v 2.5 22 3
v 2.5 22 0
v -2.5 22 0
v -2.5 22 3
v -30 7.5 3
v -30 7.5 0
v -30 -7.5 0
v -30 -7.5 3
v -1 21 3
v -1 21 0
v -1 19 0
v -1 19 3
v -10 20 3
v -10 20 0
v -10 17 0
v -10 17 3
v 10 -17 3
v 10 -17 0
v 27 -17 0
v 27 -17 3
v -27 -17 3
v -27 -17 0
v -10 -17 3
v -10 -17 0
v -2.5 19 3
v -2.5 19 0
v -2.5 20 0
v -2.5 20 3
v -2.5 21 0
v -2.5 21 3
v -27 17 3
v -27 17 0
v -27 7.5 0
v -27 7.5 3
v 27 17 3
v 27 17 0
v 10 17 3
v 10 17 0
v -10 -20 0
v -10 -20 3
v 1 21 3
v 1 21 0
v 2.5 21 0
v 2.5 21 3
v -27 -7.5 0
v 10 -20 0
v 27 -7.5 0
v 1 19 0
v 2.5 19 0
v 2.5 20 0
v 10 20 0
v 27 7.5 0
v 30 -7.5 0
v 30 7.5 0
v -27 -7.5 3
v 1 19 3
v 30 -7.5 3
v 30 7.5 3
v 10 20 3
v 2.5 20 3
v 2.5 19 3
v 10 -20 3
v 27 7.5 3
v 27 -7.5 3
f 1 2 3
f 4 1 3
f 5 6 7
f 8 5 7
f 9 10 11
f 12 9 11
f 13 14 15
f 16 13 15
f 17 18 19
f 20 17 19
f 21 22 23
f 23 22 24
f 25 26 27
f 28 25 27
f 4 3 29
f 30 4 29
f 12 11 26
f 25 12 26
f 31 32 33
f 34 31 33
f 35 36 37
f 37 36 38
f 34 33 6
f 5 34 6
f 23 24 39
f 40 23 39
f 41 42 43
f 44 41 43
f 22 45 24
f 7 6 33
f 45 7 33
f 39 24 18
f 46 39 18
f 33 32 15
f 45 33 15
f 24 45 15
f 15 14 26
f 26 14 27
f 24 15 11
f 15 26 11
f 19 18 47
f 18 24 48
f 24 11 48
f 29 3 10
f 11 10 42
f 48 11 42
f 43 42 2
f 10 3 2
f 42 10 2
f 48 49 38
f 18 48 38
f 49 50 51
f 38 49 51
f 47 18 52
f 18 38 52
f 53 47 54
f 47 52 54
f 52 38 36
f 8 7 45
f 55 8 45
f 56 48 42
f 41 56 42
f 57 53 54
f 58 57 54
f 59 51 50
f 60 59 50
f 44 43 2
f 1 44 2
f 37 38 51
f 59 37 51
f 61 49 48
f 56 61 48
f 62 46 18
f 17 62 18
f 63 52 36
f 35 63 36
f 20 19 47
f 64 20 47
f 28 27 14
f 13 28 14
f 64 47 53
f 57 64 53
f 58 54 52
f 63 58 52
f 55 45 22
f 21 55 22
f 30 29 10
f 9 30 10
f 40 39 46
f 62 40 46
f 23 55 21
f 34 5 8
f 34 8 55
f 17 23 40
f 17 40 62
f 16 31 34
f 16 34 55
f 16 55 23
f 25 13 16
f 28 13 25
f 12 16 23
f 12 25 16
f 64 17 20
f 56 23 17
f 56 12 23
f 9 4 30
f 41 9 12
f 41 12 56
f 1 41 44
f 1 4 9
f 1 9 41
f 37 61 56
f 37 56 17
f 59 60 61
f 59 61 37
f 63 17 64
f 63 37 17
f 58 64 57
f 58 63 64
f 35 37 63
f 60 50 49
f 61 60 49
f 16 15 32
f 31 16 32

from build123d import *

# Parameters (mm, degrees)
F1_DEPTH = 3


with BuildPart() as f1:
    # F0 (on Top) → F1 (new body)
    with BuildSketch(Plane.XY):
        Polygon((10, 17), (10, 20), (2.5, 20), (2.5, 19), (2.5, 18), (0, 16), (-2.5, 18), (-2.5, 19), (-2.5, 19.7), (-2.5, 20), (-10, 20), (-10, 17), (-27, 17), (-27, 7.5), (-30, 7.5), (-30, -7.5), (-27, -7.5), (-27, -17), (-10, -17), (-10, -20), (10, -20), (10, -17), (27, -17), (27, -7.5), (30, -7.5), (30, 7.5), (27, 7.5), (27, 17), align=None)
        Polygon((0, 16), (2.5, 18), (0, 18), align=None)
        Polygon((0, 16), (0, 18), (-2.5, 18), align=None)
        Polygon((-2.5, 18), (0, 18), (0, 20), (-1, 20), (-1, 19), (-2.5, 19), align=None)
        Polygon((2.5, 18), (2.5, 19), (1, 19), (1, 20), (0, 20), (0, 18), align=None)
        Polygon((0, 20), (1, 20), (1, 21), (2.5, 21), (2.5, 22), (-2.5, 22), (-2.5, 21), (-1, 21), (-1, 20), align=None)
    extrude(amount=F1_DEPTH)


solid = f1.part
